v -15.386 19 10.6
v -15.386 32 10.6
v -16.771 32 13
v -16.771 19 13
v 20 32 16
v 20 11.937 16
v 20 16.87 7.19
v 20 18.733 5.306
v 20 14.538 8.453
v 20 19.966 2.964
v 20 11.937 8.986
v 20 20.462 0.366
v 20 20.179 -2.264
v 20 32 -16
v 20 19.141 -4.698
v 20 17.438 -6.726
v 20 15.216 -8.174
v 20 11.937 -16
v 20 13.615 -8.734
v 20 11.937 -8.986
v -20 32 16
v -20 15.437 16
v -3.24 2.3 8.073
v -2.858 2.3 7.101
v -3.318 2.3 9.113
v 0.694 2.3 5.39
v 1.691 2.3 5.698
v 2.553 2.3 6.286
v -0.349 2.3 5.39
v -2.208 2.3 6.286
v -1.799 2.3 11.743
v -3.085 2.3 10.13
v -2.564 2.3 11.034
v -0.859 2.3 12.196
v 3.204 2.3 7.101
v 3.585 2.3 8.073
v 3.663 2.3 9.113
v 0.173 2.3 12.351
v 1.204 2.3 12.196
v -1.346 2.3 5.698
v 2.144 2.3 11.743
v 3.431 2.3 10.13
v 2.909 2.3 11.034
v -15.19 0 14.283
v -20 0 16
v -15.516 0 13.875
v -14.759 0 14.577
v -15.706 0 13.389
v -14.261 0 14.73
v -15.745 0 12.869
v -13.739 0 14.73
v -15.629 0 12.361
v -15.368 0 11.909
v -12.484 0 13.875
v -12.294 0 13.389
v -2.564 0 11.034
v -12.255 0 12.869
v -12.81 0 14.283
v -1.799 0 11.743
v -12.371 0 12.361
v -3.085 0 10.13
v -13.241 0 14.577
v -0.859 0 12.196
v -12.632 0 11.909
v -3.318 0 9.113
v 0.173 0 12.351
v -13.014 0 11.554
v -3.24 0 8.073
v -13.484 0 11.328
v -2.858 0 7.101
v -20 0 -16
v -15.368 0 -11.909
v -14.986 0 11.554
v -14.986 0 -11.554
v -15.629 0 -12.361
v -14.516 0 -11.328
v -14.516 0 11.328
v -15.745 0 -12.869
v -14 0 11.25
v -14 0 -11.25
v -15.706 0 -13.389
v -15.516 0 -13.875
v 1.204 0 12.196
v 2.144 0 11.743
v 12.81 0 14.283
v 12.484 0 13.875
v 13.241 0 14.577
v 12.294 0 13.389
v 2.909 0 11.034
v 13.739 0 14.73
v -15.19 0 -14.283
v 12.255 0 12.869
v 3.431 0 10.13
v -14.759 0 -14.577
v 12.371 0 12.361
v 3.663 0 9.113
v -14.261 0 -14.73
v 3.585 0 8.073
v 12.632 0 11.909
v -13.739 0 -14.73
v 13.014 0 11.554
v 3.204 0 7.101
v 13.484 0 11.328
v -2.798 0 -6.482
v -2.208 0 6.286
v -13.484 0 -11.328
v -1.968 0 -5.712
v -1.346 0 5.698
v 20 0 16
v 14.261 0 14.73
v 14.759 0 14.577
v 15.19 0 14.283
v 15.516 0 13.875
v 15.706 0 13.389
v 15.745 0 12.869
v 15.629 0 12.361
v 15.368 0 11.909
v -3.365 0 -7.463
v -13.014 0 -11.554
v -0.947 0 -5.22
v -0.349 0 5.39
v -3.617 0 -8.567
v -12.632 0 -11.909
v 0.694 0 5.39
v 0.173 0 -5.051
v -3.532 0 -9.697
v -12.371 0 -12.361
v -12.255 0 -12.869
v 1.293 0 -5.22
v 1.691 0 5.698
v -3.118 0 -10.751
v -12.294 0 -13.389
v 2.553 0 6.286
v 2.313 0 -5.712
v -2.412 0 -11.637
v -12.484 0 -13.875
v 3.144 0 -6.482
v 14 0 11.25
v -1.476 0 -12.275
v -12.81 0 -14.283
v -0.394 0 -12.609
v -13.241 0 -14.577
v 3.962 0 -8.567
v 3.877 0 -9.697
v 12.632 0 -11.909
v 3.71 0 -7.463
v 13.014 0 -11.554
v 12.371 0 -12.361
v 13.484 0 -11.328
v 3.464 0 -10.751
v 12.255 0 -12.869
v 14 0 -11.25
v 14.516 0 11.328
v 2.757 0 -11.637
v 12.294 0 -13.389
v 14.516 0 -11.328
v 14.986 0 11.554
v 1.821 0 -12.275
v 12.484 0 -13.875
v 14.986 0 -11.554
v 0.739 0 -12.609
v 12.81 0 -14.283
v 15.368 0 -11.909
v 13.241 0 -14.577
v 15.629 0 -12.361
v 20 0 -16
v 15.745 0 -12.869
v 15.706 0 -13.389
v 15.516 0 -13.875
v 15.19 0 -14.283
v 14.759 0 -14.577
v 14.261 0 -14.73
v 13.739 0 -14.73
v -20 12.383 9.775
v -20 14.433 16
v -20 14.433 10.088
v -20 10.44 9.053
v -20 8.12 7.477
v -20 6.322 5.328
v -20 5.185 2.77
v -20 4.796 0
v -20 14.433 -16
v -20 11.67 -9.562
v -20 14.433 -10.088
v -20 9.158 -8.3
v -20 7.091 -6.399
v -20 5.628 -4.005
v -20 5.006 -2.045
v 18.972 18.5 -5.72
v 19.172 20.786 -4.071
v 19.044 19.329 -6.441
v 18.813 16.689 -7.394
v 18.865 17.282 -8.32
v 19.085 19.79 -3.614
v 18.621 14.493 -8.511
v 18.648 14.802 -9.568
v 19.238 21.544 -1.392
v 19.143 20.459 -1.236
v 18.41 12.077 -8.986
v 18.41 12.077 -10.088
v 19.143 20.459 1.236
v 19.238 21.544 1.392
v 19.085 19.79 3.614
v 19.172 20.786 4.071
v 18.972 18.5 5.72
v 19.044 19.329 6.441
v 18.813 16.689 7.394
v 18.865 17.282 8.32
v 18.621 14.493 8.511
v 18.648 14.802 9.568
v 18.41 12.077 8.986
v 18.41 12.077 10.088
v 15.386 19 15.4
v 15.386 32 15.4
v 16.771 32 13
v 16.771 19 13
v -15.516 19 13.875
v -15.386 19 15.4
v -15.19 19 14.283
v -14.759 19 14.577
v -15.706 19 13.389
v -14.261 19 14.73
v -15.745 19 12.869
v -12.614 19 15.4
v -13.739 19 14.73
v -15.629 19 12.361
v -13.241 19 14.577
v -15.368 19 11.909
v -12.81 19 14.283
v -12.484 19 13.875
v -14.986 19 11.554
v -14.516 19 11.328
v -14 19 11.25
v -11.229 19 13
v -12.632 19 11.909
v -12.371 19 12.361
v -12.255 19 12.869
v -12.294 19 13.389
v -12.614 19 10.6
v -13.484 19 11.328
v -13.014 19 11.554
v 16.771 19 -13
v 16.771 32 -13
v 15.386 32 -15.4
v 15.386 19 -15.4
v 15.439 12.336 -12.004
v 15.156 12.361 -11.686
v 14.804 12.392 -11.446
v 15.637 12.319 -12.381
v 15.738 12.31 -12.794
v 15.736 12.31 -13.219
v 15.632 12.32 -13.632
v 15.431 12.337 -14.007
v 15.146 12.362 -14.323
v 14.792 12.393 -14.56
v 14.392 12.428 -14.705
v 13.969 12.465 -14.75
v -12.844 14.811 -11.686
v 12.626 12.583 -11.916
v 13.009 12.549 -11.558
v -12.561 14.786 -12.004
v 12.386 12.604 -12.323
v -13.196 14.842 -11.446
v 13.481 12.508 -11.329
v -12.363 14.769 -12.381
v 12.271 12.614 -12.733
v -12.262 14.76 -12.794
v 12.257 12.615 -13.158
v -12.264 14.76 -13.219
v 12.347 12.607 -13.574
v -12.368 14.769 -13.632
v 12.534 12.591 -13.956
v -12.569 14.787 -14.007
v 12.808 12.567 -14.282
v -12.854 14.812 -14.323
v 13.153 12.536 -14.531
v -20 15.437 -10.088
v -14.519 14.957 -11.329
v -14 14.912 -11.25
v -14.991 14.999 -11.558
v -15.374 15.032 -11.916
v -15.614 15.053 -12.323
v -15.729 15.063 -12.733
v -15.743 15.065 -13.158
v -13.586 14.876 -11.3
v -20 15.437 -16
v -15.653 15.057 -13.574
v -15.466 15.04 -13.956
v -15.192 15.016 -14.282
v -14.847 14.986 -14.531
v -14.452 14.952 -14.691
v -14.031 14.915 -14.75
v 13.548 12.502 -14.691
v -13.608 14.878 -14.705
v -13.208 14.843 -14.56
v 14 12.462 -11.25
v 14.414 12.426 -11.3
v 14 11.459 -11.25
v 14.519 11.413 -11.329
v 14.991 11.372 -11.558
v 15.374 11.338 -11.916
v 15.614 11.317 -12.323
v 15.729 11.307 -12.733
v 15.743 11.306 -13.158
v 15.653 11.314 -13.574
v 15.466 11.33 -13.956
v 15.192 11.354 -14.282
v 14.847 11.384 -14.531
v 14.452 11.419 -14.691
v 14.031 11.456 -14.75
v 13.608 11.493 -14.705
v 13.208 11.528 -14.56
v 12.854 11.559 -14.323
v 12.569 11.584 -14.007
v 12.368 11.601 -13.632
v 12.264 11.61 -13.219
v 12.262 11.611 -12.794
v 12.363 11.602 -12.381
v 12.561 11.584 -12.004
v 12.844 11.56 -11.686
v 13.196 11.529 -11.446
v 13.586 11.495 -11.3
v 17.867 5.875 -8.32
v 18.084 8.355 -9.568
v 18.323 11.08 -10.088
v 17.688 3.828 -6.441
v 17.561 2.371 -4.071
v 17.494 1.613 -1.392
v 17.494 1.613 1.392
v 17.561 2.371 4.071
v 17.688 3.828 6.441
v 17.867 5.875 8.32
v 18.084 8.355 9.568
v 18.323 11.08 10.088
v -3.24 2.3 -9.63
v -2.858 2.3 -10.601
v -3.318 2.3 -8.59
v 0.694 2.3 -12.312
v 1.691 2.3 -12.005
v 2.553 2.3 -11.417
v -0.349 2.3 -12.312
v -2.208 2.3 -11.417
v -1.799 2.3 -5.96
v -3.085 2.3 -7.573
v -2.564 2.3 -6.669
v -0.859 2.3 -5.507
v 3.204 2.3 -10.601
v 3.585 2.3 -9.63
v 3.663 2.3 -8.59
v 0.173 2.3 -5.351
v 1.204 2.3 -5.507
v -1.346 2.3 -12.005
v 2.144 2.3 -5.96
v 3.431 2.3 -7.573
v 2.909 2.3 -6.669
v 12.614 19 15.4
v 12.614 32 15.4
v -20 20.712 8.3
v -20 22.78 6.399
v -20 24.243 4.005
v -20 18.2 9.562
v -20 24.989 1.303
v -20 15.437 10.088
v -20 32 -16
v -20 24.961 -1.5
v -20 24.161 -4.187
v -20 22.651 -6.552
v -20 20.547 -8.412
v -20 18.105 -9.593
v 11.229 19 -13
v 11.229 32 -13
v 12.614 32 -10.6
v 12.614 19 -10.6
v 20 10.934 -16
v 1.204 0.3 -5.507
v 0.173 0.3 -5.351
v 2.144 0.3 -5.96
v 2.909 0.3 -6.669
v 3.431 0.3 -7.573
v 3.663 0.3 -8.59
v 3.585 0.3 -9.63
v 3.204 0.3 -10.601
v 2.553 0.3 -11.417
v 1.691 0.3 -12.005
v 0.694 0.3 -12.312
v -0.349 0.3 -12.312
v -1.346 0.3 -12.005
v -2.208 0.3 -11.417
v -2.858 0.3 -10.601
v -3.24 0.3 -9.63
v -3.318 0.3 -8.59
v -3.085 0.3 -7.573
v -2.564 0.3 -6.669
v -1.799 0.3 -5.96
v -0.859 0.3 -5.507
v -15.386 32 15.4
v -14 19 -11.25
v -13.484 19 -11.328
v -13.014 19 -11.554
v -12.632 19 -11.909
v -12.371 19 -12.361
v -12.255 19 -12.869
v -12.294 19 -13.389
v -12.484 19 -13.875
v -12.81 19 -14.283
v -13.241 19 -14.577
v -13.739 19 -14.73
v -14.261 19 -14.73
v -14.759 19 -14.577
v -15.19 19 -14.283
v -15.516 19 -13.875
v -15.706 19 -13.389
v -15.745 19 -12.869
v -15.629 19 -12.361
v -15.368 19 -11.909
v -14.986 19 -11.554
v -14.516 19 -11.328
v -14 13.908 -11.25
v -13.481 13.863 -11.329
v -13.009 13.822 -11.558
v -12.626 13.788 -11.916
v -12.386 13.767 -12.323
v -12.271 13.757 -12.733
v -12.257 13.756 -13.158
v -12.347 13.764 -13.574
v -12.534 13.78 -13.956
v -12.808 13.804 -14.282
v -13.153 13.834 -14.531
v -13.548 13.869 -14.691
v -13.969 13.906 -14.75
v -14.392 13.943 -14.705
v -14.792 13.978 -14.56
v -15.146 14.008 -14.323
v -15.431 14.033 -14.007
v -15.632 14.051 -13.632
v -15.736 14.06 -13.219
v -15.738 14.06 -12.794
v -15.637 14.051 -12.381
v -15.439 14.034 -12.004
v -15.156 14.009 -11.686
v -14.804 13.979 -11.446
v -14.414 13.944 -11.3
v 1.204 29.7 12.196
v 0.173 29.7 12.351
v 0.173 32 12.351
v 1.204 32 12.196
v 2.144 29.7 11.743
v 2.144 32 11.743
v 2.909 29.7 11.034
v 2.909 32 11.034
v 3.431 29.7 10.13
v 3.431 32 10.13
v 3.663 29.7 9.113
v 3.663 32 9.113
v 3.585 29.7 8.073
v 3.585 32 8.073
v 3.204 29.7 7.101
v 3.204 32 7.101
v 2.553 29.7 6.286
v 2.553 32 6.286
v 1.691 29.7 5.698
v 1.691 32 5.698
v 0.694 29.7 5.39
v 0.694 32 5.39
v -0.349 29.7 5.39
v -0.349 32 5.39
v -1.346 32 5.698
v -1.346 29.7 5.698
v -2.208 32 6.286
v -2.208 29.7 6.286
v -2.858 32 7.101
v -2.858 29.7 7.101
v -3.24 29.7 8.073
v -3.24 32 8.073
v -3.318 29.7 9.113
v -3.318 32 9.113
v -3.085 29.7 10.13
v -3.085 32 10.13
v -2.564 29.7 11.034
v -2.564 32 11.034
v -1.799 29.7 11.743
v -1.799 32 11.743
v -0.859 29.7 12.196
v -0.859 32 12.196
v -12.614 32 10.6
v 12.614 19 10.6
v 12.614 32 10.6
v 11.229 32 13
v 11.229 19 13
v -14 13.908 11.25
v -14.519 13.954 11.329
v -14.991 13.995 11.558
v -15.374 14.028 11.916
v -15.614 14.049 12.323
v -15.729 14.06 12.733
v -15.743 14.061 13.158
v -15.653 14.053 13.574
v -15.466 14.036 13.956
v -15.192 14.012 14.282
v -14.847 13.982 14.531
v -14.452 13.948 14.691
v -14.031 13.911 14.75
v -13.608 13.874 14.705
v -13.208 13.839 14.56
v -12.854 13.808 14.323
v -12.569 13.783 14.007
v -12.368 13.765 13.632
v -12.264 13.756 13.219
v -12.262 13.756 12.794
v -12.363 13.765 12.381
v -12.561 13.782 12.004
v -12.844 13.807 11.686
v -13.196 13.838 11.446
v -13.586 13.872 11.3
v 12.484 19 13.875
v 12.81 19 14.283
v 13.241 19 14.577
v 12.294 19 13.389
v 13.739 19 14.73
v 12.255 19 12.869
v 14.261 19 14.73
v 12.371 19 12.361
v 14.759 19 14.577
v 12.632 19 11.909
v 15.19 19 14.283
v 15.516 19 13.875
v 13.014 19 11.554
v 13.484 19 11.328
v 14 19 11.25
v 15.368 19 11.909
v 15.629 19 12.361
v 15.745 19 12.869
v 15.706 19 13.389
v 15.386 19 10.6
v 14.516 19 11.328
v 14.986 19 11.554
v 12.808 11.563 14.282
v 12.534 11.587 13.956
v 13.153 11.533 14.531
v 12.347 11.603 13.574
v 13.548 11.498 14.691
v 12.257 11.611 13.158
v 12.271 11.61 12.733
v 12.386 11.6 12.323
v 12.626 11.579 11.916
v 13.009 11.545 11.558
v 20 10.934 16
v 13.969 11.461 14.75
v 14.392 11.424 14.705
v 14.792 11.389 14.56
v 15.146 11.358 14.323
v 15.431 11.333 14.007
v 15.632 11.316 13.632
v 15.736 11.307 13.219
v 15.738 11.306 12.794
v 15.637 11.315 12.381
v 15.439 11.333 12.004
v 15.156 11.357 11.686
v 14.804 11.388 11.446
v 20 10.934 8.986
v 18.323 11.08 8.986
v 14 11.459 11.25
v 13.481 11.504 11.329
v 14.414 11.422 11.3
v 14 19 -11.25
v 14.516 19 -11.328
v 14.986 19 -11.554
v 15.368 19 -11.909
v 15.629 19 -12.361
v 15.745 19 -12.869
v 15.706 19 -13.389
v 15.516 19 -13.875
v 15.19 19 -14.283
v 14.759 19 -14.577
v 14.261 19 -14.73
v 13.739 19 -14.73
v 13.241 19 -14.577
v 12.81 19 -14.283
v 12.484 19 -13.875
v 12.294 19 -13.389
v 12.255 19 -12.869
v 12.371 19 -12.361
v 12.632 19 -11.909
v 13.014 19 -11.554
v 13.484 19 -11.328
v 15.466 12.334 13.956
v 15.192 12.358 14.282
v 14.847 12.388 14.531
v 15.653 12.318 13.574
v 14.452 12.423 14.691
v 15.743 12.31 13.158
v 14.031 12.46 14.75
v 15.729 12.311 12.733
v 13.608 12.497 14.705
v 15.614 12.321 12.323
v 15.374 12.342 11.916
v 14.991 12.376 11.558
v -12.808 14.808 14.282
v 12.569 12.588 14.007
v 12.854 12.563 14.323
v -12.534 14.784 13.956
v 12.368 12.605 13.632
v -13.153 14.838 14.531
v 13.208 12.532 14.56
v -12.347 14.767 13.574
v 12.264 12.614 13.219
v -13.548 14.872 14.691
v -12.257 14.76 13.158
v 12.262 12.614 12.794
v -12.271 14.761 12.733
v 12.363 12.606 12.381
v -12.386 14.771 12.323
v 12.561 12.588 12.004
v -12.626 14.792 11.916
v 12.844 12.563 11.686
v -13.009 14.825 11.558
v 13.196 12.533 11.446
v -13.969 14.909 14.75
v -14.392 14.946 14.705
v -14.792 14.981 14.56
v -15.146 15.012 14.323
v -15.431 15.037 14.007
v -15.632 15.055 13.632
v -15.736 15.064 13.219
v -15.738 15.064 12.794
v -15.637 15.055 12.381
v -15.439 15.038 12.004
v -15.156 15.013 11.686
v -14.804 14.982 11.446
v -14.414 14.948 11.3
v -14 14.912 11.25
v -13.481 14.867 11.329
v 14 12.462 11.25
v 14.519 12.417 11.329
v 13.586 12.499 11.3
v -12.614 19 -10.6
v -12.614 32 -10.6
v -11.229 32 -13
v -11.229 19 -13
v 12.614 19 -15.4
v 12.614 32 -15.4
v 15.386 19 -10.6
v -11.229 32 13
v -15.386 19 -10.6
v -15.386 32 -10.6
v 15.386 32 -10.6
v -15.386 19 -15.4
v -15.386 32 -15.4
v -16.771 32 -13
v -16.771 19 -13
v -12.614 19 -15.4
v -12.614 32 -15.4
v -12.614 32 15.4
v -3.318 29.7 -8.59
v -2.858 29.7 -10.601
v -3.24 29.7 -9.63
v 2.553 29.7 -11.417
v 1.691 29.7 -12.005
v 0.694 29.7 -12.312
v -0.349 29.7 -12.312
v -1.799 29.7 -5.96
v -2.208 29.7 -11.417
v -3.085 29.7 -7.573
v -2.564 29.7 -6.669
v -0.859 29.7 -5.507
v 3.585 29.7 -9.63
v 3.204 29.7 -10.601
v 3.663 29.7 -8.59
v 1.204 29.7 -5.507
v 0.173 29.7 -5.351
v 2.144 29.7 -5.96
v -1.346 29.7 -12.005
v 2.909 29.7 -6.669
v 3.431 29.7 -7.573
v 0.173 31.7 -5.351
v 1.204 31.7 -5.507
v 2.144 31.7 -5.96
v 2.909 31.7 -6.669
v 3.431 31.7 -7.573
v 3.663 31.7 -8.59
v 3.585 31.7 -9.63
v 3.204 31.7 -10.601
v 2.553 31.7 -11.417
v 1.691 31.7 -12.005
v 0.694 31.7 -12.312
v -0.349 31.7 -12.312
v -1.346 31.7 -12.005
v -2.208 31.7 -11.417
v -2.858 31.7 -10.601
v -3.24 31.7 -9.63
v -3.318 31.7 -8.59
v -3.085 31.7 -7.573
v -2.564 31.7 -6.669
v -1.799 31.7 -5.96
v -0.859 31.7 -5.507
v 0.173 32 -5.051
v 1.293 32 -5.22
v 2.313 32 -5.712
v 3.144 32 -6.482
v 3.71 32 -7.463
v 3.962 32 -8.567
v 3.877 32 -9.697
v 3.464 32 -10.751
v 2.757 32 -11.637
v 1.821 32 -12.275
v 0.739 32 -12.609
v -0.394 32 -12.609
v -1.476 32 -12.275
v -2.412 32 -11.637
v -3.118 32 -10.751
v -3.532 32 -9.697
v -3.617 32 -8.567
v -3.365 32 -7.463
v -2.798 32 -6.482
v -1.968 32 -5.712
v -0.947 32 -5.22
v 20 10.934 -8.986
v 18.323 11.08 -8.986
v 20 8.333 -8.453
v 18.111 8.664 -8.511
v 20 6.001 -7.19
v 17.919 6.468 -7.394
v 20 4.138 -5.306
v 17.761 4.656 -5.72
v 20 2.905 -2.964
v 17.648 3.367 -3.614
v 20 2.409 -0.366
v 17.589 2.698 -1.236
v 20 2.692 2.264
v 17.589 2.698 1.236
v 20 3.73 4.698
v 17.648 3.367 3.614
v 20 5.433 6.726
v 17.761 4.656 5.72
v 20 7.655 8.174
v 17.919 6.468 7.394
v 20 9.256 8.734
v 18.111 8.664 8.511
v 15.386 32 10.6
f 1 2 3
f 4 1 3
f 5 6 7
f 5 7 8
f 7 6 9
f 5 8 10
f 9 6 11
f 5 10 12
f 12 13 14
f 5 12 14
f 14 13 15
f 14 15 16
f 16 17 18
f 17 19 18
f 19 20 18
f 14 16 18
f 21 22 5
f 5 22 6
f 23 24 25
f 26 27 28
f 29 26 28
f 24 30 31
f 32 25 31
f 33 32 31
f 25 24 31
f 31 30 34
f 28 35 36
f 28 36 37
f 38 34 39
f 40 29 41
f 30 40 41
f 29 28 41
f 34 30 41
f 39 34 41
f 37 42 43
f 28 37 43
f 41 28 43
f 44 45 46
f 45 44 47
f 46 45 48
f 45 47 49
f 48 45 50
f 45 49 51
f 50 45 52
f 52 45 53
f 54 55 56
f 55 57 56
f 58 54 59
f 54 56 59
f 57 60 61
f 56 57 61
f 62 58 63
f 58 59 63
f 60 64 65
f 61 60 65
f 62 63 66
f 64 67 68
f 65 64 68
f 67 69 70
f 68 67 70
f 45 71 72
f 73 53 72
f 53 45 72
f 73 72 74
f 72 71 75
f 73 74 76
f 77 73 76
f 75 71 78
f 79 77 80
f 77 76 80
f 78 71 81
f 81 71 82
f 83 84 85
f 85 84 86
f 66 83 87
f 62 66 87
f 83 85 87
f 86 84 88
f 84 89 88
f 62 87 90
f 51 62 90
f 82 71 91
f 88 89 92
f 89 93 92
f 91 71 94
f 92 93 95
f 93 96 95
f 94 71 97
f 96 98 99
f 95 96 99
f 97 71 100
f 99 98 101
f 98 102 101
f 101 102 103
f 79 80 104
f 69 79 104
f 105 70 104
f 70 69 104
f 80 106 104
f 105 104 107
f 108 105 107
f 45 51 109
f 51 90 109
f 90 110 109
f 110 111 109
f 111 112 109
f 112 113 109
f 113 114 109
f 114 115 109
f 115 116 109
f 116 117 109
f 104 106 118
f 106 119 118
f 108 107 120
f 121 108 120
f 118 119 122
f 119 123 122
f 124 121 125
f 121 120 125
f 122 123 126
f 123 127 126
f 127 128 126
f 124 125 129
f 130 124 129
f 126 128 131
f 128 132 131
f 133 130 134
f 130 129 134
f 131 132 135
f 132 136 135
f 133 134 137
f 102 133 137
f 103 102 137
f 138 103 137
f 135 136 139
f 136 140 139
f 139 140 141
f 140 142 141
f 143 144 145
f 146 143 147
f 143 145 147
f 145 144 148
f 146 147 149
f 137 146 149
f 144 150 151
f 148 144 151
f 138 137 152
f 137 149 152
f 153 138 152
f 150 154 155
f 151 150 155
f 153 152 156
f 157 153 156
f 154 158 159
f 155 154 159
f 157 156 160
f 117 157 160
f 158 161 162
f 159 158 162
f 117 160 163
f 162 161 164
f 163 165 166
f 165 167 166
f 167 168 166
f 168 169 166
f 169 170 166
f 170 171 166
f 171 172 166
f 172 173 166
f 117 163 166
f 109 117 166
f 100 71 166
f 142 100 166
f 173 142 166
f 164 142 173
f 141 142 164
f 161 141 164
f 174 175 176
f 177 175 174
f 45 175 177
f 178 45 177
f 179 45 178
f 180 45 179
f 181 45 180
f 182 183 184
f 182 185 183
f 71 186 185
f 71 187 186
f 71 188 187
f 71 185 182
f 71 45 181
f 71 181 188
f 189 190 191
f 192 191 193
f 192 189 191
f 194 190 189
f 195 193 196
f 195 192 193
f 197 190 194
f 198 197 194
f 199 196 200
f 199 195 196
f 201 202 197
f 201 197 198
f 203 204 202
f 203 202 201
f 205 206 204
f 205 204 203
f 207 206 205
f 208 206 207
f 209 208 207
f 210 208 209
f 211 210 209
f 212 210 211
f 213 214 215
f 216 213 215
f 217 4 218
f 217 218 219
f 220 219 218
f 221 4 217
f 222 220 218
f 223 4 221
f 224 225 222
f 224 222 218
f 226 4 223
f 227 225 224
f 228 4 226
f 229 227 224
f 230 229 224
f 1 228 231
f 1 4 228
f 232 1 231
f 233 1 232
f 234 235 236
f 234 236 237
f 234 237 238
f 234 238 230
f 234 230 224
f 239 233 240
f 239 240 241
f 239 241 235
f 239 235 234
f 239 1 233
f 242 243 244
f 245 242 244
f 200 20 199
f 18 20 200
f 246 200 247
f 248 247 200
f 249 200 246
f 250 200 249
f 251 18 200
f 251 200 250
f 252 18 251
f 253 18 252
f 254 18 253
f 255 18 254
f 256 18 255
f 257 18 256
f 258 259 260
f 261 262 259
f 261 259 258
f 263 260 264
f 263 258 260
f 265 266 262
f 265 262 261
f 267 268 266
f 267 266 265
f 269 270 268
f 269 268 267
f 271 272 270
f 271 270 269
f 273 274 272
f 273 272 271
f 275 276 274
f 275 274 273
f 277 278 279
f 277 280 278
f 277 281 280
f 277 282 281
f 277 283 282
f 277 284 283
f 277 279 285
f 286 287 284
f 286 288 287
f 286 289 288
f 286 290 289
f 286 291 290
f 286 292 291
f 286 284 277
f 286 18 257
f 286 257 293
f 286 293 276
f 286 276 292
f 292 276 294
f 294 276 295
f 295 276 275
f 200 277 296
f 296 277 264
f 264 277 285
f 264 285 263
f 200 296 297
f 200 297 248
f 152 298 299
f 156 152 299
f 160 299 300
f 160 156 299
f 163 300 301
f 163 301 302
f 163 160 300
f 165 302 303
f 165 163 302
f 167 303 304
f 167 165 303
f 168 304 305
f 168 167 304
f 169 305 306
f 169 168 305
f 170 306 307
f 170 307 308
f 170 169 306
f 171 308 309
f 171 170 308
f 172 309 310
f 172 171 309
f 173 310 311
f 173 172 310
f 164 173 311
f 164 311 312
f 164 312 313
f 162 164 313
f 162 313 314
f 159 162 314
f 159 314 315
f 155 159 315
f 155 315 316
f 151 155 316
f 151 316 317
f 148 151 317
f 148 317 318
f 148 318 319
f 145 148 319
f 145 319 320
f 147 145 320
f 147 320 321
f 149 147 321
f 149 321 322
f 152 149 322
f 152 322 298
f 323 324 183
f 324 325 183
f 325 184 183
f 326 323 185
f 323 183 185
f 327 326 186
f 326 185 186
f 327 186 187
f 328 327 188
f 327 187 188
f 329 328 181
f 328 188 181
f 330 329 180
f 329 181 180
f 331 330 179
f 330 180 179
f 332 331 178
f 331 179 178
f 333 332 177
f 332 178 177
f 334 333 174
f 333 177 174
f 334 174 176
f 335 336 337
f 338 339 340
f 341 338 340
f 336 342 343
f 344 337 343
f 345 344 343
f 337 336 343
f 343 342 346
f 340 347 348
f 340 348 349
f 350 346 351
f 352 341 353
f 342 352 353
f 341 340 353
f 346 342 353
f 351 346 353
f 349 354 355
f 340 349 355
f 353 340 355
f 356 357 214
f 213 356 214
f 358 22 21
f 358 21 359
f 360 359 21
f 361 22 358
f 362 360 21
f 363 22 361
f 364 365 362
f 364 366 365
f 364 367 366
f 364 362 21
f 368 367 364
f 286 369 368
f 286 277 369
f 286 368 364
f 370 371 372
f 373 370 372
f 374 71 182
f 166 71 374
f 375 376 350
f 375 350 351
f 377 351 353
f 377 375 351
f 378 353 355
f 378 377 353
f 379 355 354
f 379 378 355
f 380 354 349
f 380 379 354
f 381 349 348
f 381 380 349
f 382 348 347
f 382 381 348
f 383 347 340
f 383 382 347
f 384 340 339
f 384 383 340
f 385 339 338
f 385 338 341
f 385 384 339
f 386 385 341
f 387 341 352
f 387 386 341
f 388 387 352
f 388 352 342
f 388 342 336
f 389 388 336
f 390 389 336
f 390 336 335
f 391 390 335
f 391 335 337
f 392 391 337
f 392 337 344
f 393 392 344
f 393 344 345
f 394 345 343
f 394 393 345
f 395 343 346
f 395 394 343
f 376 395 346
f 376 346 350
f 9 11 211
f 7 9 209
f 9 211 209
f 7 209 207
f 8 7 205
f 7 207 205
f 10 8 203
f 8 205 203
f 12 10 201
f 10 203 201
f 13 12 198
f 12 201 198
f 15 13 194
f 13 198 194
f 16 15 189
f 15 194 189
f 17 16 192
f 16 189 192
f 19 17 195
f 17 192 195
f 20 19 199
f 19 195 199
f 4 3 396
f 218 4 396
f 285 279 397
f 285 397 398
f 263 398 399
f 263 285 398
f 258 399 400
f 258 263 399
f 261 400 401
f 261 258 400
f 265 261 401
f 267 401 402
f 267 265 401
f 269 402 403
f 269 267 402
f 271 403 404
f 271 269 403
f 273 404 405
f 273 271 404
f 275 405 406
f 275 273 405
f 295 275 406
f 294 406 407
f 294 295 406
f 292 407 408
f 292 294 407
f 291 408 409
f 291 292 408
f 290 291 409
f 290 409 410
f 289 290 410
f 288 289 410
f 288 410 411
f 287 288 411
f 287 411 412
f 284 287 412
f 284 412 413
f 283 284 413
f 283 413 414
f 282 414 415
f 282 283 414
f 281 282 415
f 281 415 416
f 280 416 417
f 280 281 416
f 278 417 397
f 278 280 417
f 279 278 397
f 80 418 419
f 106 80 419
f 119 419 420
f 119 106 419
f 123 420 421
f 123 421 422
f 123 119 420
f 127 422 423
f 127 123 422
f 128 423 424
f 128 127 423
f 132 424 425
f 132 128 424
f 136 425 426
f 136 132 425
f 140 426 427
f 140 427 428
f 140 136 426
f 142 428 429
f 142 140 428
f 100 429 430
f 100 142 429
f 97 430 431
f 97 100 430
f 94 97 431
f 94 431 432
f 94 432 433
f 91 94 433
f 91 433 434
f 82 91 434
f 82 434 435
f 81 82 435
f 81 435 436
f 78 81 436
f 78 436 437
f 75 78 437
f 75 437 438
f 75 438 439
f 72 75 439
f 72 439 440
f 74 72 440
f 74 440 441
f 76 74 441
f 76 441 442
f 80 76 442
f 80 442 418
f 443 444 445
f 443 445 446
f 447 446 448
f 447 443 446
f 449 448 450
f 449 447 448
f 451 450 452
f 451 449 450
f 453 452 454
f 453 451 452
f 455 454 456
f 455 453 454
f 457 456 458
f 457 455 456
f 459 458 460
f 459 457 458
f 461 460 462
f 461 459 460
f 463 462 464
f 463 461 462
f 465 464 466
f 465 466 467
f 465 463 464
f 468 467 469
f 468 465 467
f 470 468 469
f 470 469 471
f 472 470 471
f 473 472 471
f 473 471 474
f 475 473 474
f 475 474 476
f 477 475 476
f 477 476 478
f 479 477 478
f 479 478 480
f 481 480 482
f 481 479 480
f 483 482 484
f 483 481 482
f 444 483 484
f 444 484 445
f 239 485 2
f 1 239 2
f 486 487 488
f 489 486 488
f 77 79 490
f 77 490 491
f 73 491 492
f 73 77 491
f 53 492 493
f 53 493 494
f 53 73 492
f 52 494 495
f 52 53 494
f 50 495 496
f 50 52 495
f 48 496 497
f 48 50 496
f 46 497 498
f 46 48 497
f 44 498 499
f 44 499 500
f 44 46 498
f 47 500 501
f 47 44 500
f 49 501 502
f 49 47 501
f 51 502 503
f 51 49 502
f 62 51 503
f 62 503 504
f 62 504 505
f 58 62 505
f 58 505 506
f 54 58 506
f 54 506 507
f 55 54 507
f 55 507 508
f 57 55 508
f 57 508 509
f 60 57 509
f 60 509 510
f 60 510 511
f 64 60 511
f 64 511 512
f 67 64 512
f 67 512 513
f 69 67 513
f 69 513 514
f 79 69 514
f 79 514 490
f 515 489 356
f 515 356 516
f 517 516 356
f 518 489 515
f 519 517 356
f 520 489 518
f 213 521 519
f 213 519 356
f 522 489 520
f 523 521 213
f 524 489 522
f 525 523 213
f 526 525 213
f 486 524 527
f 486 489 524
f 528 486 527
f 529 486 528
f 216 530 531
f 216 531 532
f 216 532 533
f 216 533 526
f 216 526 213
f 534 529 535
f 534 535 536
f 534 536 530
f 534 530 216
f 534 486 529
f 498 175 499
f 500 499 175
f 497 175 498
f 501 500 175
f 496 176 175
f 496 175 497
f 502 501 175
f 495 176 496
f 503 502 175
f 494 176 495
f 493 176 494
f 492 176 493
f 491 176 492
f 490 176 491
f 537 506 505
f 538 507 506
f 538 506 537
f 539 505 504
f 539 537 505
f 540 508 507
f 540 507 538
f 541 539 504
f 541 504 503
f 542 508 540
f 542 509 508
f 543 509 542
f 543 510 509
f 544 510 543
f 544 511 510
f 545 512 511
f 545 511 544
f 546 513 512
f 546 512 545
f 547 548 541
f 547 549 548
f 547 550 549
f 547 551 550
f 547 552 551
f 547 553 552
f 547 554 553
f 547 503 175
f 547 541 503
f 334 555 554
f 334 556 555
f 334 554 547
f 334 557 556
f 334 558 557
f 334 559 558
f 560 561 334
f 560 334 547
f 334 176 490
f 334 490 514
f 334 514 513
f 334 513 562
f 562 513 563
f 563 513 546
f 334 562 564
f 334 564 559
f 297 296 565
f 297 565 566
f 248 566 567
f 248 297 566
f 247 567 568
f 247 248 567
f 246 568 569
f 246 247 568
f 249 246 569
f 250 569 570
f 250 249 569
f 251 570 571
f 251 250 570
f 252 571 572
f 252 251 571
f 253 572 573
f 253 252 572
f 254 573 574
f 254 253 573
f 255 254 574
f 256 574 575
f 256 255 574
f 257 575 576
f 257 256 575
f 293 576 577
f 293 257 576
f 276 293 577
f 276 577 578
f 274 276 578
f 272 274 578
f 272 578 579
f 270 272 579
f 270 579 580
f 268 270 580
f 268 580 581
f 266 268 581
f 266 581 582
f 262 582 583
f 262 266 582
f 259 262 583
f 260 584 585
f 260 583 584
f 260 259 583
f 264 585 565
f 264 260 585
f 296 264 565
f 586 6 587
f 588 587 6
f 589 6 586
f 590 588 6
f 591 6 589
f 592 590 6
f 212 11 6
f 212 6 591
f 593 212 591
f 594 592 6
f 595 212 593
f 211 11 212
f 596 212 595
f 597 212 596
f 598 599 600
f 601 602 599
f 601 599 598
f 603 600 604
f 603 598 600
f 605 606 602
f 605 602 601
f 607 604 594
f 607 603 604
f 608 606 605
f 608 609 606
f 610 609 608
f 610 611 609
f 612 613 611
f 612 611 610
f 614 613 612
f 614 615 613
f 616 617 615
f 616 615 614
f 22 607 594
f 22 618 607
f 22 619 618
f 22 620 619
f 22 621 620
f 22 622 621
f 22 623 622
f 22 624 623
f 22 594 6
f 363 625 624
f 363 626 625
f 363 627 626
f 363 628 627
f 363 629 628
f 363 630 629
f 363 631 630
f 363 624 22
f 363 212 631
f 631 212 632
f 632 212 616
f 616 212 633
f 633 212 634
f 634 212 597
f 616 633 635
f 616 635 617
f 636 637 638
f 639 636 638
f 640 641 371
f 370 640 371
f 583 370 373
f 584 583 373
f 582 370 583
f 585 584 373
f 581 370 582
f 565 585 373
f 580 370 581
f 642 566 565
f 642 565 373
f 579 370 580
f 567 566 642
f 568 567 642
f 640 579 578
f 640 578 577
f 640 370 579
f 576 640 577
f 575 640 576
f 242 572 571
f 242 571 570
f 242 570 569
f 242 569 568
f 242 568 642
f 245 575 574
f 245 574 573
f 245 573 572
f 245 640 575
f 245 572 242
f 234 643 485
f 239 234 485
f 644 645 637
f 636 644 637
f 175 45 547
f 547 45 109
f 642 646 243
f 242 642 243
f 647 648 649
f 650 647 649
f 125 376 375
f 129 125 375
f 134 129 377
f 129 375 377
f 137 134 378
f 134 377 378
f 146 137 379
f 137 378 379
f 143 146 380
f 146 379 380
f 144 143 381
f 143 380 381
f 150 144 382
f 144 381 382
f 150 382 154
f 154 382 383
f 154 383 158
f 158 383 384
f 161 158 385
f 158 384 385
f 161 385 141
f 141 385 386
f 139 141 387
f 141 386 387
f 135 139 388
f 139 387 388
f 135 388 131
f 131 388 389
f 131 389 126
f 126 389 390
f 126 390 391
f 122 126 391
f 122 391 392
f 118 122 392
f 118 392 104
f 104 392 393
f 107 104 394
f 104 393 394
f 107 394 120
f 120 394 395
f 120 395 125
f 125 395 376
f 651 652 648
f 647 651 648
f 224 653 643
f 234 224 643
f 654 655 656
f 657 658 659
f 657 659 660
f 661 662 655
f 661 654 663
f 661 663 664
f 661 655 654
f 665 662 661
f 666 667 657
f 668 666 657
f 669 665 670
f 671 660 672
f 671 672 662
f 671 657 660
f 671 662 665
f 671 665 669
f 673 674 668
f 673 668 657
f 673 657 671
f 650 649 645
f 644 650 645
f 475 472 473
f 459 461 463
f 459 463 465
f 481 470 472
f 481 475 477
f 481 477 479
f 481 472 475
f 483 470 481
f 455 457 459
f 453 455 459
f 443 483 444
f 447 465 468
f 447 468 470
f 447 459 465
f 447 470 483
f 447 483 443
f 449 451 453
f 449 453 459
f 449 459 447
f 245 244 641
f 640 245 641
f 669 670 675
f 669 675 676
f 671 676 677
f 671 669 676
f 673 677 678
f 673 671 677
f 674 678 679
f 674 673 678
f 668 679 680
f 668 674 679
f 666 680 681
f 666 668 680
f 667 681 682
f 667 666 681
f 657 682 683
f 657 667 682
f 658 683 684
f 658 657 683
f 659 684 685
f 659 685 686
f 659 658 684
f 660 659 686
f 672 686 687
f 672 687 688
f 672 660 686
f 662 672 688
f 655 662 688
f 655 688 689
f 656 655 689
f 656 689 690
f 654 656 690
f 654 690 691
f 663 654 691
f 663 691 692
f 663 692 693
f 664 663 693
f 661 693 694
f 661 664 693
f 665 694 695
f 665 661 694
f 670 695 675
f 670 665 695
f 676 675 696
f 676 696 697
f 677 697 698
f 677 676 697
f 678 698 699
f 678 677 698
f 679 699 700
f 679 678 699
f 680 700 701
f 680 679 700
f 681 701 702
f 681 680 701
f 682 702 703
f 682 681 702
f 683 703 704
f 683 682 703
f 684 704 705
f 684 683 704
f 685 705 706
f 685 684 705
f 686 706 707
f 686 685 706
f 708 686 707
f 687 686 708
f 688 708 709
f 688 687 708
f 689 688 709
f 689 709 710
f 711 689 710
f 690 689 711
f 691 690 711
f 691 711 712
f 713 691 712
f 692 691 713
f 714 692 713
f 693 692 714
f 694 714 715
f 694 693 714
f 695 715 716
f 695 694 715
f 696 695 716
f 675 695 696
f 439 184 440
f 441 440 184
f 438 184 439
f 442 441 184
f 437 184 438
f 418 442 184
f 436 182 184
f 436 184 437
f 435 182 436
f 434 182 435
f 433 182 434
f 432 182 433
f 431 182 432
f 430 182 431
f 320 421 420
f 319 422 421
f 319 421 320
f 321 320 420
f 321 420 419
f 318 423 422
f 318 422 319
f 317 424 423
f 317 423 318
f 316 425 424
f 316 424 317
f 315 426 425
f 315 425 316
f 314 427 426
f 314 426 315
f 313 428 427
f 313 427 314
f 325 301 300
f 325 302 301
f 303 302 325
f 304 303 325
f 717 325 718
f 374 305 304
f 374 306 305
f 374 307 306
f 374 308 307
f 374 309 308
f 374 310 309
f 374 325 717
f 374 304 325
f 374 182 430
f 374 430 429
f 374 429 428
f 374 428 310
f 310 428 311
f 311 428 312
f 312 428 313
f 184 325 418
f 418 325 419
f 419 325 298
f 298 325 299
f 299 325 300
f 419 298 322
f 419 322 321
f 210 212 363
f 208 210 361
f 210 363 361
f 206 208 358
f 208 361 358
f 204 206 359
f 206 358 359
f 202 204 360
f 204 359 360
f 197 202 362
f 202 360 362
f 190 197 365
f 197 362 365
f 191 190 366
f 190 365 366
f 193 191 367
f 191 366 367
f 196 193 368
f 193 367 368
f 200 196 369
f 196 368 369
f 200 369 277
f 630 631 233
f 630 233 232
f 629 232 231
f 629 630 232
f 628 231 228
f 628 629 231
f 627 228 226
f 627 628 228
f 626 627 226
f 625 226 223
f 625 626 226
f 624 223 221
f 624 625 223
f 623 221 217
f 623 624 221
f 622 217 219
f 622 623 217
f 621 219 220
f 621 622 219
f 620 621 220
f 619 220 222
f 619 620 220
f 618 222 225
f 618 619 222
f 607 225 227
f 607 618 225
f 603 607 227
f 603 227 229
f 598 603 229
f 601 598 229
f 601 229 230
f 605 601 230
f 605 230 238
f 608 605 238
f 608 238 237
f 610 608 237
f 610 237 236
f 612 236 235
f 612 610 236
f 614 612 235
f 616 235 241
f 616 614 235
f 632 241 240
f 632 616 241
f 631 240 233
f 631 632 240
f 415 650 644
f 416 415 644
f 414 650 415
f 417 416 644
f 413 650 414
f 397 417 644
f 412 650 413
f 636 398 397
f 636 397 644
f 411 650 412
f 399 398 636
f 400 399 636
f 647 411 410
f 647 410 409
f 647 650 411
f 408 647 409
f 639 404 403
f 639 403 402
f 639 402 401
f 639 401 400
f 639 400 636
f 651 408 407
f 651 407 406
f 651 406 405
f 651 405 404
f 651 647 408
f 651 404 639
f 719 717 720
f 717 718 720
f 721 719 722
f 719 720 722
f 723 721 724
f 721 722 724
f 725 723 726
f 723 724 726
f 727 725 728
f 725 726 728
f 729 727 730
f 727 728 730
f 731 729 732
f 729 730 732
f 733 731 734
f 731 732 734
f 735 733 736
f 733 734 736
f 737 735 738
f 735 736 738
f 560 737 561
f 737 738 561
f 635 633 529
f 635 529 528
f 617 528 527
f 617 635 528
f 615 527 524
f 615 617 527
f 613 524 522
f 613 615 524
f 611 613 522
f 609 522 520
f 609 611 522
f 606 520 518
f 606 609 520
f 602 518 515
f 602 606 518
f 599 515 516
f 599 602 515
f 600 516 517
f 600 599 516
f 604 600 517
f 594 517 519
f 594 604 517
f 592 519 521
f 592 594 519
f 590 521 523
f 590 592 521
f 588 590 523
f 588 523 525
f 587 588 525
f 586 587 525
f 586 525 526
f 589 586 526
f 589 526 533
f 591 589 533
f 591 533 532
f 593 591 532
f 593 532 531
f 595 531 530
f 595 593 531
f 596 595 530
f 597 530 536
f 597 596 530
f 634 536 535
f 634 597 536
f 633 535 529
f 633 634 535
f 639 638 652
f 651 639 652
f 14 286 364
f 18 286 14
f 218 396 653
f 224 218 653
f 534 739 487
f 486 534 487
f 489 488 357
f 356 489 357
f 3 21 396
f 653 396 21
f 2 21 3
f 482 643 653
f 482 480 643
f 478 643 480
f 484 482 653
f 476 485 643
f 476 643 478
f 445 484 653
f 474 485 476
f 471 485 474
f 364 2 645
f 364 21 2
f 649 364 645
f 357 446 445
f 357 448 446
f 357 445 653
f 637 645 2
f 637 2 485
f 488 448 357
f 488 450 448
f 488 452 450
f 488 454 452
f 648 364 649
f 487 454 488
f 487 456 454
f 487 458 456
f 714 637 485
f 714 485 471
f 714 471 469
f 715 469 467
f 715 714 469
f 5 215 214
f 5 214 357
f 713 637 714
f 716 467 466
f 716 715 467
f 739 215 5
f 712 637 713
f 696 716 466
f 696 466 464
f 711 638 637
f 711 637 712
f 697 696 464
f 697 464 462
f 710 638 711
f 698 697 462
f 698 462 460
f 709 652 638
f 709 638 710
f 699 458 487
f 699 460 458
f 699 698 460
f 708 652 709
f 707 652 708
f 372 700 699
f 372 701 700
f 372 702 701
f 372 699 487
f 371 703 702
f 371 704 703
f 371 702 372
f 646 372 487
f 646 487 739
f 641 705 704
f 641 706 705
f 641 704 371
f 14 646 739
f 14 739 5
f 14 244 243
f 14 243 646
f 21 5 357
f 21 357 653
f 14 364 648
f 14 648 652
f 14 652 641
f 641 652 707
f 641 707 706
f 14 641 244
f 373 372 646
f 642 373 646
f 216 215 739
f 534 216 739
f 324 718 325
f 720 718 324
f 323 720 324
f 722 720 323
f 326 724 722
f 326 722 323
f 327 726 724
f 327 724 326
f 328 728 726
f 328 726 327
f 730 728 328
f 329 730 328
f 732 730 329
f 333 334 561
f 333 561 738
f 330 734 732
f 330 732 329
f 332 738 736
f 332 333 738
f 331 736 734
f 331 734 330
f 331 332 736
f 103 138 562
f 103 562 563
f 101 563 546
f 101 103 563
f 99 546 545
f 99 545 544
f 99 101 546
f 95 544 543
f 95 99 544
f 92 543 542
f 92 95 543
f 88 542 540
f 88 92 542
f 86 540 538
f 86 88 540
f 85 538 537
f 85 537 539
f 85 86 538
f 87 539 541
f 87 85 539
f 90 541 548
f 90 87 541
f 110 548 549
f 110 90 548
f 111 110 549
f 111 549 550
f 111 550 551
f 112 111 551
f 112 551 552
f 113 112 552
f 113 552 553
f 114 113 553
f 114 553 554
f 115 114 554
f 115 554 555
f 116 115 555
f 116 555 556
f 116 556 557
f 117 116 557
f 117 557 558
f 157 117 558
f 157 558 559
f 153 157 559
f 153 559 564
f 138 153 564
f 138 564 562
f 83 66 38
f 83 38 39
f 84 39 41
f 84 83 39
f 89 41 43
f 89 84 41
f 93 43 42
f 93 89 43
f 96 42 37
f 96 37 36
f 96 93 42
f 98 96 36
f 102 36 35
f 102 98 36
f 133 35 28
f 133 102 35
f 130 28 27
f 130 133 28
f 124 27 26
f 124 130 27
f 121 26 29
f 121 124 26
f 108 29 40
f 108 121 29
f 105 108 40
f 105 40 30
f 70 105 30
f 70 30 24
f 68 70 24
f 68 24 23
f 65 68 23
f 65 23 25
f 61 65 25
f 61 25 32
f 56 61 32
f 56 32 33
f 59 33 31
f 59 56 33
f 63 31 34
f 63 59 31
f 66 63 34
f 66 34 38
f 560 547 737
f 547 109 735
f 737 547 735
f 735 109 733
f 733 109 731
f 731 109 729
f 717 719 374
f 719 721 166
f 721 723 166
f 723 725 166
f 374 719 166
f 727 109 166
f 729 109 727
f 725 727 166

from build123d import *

# Parameters (mm, degrees)
SKETCH1_W              = 40
SKETCH1_H              = 32
BOSS_EXTRUDE1_DEPTH    = 32
SKETCH2_R              = 10.1
CUT_EXTRUDE1_DEPTH     = 40
SKETCH3_R              = 1.75
CUT_EXTRUDE2_DEPTH     = 41.987803064
CUT_EXTRUDE3_DEPTH     = 13
SPLIT2_SURFACE_1_BACK  = 61.399
SPLIT2_SURFACE_1_DEPTH = 122.798
SKETCH10_R             = 3.5
CUT_EXTRUDE5_DEPTH     = 2.3
CUT_EXTRUDE6_START     = -2.3
SKETCH11_R             = 3.5
CUT_EXTRUDE6_DEPTH     = 2.3
SKETCH12_R             = 9
CUT_EXTRUDE7_DEPTH     = 55.536602893
CHAMFER3_SIZE          = 0.3
CHAMFER4_SIZE          = 0.3


with BuildPart() as part:
    # Sketch1 → Boss-Extrude1 (new body)
    with BuildSketch(Plane(origin=(0, 0, 0), x_dir=(1, 0, 0), z_dir=(0, 1, 0))):
        Rectangle(SKETCH1_W, SKETCH1_H)
    extrude(amount=BOSS_EXTRUDE1_DEPTH)

    # Sketch2 → Cut-Extrude1 (cut)
    with BuildSketch(Plane(origin=(-22.626448373, 1.979557728, 0), x_dir=(0, 0, 1), z_dir=(-0.9961946980917455, 0.08715574274765836, 0))):
        with Locations(Location((0, 13.135115484, 0), (0, 0, 270))):
            Circle(SKETCH2_R)
    extrude(amount=-CUT_EXTRUDE1_DEPTH, mode=Mode.SUBTRACT)

    # Sketch3 → Cut-Extrude2 (cut, through all)
    with BuildSketch(Plane(origin=(0, 0, 0), x_dir=(1, 0, 0), z_dir=(0, 1, 0))):
        with Locations(Location((-14, 13, 0), (0, 0, 270))):
            Circle(SKETCH3_R)
        with Locations(Location((14, 13, 0), (0, 0, 270))):
            Circle(SKETCH3_R)
        with Locations(Location((14, -13, 0), (0, 0, 90))):
            Circle(SKETCH3_R)
        with Locations(Location((-14, -13, 0), (0, 0, 90))):
            Circle(SKETCH3_R)
    extrude(amount=CUT_EXTRUDE2_DEPTH, mode=Mode.SUBTRACT)

    # Sketch7 → Cut-Extrude3 (cut)
    with BuildSketch(Plane(origin=(0, 32, 0), x_dir=(1, 0, 0), z_dir=(0, 1, 0))):
        Polygon((-11.228718708, 13), (-12.614359354, 15.4), (-15.385640646, 15.4), (-16.771281292, 13), (-15.385640646, 10.6), (-12.614359354, 10.6), align=None)
        Polygon((16.771281292, 13), (15.385640646, 15.4), (12.614359354, 15.4), (11.228718708, 13), (12.614359354, 10.6), (15.385640646, 10.6), align=None)
        Polygon((16.771281292, -13), (15.385640646, -10.6), (12.614359354, -10.6), (11.228718708, -13), (12.614359354, -15.4), (15.385640646, -15.4), align=None)
        Polygon((-11.228718708, -13), (-12.614359354, -10.6), (-15.385640646, -10.6), (-16.771281292, -13), (-15.385640646, -15.4), (-12.614359354, -15.4), align=None)
    extrude(amount=-CUT_EXTRUDE3_DEPTH, mode=Mode.SUBTRACT)

    # Split2: cut with a surface, the side behind it stays
    # Split2 surface: a surface, the sketch's curves swept straight by 122.798 mm
    with BuildLine(Plane.XY.offset(-SPLIT2_SURFACE_1_BACK), mode=Mode.PRIVATE) as split2_surface_1_path:
        Line((31.826155364, 9.898951774), (31.913311107, 10.895146473))
        Line((31.913311107, 10.895146473), (-21.438069755, 15.562787481))
        Line((-21.438069755, 15.562787481), (-21.525225498, 14.566592783))
        Line((-21.525225498, 14.566592783), (31.826155364, 9.898951774))
    split2_surface_1 = Shell.extrude(split2_surface_1_path.wire(), (0 * SPLIT2_SURFACE_1_DEPTH, 0 * SPLIT2_SURFACE_1_DEPTH, 1 * SPLIT2_SURFACE_1_DEPTH))
    split(bisect_by=split2_surface_1, keep=Keep.BOTTOM)

    # Sketch10 → Cut-Extrude5 (cut)
    with BuildSketch(Plane(origin=(0, 0, 0), x_dir=(1, 0, 0), z_dir=(0, 1, 0))):
        with Locations(Location((0.172645806, -8.851363161, 0), (0, 0, 270))):
            Circle(SKETCH10_R)
        with Locations(Location((0.172645806, 8.851363161, 0), (0, 0, 270))):
            Circle(SKETCH10_R)
    extrude(amount=CUT_EXTRUDE5_DEPTH, mode=Mode.SUBTRACT)

    # Sketch11 → Cut-Extrude6 (cut)
    with BuildSketch(Plane(origin=(0, 32, 0), x_dir=(1, 0, 0), z_dir=(0, 1, 0)).offset(CUT_EXTRUDE6_START)):
        with Locations(Location((0.172645806, -8.851363161, 0), (0, 0, 270))):
            Circle(SKETCH11_R)
        with Locations(Location((0.172645806, 8.851363161, 0), (0, 0, 270))):
            Circle(SKETCH11_R)
    extrude(amount=CUT_EXTRUDE6_DEPTH, mode=Mode.SUBTRACT)

    # Sketch12 → Cut-Extrude7 (cut, through all)
    with BuildSketch(Plane(origin=(-22.626448373, 1.979557728, 0), x_dir=(0, 0, 1), z_dir=(-0.9961946980917455, 0.08715574274765836, 0))):
        with Locations((0, 13.135115484)):
            Circle(SKETCH12_R)
    extrude(amount=-CUT_EXTRUDE7_DEPTH, mode=Mode.SUBTRACT)

    # Chamfer3
    chamfer3_edges = [part.edges().sort_by_distance(p)[0] for p in [
        (0.172645806, 32, -12.351363161),
    ]]
    chamfer(chamfer3_edges, length=CHAMFER3_SIZE)

    # Chamfer4
    chamfer4_edges = [part.edges().sort_by_distance(p)[0] for p in [
        (0.172645806, 0, -12.351363161),
    ]]
    chamfer(chamfer4_edges, length=CHAMFER4_SIZE)


solid = part.part
